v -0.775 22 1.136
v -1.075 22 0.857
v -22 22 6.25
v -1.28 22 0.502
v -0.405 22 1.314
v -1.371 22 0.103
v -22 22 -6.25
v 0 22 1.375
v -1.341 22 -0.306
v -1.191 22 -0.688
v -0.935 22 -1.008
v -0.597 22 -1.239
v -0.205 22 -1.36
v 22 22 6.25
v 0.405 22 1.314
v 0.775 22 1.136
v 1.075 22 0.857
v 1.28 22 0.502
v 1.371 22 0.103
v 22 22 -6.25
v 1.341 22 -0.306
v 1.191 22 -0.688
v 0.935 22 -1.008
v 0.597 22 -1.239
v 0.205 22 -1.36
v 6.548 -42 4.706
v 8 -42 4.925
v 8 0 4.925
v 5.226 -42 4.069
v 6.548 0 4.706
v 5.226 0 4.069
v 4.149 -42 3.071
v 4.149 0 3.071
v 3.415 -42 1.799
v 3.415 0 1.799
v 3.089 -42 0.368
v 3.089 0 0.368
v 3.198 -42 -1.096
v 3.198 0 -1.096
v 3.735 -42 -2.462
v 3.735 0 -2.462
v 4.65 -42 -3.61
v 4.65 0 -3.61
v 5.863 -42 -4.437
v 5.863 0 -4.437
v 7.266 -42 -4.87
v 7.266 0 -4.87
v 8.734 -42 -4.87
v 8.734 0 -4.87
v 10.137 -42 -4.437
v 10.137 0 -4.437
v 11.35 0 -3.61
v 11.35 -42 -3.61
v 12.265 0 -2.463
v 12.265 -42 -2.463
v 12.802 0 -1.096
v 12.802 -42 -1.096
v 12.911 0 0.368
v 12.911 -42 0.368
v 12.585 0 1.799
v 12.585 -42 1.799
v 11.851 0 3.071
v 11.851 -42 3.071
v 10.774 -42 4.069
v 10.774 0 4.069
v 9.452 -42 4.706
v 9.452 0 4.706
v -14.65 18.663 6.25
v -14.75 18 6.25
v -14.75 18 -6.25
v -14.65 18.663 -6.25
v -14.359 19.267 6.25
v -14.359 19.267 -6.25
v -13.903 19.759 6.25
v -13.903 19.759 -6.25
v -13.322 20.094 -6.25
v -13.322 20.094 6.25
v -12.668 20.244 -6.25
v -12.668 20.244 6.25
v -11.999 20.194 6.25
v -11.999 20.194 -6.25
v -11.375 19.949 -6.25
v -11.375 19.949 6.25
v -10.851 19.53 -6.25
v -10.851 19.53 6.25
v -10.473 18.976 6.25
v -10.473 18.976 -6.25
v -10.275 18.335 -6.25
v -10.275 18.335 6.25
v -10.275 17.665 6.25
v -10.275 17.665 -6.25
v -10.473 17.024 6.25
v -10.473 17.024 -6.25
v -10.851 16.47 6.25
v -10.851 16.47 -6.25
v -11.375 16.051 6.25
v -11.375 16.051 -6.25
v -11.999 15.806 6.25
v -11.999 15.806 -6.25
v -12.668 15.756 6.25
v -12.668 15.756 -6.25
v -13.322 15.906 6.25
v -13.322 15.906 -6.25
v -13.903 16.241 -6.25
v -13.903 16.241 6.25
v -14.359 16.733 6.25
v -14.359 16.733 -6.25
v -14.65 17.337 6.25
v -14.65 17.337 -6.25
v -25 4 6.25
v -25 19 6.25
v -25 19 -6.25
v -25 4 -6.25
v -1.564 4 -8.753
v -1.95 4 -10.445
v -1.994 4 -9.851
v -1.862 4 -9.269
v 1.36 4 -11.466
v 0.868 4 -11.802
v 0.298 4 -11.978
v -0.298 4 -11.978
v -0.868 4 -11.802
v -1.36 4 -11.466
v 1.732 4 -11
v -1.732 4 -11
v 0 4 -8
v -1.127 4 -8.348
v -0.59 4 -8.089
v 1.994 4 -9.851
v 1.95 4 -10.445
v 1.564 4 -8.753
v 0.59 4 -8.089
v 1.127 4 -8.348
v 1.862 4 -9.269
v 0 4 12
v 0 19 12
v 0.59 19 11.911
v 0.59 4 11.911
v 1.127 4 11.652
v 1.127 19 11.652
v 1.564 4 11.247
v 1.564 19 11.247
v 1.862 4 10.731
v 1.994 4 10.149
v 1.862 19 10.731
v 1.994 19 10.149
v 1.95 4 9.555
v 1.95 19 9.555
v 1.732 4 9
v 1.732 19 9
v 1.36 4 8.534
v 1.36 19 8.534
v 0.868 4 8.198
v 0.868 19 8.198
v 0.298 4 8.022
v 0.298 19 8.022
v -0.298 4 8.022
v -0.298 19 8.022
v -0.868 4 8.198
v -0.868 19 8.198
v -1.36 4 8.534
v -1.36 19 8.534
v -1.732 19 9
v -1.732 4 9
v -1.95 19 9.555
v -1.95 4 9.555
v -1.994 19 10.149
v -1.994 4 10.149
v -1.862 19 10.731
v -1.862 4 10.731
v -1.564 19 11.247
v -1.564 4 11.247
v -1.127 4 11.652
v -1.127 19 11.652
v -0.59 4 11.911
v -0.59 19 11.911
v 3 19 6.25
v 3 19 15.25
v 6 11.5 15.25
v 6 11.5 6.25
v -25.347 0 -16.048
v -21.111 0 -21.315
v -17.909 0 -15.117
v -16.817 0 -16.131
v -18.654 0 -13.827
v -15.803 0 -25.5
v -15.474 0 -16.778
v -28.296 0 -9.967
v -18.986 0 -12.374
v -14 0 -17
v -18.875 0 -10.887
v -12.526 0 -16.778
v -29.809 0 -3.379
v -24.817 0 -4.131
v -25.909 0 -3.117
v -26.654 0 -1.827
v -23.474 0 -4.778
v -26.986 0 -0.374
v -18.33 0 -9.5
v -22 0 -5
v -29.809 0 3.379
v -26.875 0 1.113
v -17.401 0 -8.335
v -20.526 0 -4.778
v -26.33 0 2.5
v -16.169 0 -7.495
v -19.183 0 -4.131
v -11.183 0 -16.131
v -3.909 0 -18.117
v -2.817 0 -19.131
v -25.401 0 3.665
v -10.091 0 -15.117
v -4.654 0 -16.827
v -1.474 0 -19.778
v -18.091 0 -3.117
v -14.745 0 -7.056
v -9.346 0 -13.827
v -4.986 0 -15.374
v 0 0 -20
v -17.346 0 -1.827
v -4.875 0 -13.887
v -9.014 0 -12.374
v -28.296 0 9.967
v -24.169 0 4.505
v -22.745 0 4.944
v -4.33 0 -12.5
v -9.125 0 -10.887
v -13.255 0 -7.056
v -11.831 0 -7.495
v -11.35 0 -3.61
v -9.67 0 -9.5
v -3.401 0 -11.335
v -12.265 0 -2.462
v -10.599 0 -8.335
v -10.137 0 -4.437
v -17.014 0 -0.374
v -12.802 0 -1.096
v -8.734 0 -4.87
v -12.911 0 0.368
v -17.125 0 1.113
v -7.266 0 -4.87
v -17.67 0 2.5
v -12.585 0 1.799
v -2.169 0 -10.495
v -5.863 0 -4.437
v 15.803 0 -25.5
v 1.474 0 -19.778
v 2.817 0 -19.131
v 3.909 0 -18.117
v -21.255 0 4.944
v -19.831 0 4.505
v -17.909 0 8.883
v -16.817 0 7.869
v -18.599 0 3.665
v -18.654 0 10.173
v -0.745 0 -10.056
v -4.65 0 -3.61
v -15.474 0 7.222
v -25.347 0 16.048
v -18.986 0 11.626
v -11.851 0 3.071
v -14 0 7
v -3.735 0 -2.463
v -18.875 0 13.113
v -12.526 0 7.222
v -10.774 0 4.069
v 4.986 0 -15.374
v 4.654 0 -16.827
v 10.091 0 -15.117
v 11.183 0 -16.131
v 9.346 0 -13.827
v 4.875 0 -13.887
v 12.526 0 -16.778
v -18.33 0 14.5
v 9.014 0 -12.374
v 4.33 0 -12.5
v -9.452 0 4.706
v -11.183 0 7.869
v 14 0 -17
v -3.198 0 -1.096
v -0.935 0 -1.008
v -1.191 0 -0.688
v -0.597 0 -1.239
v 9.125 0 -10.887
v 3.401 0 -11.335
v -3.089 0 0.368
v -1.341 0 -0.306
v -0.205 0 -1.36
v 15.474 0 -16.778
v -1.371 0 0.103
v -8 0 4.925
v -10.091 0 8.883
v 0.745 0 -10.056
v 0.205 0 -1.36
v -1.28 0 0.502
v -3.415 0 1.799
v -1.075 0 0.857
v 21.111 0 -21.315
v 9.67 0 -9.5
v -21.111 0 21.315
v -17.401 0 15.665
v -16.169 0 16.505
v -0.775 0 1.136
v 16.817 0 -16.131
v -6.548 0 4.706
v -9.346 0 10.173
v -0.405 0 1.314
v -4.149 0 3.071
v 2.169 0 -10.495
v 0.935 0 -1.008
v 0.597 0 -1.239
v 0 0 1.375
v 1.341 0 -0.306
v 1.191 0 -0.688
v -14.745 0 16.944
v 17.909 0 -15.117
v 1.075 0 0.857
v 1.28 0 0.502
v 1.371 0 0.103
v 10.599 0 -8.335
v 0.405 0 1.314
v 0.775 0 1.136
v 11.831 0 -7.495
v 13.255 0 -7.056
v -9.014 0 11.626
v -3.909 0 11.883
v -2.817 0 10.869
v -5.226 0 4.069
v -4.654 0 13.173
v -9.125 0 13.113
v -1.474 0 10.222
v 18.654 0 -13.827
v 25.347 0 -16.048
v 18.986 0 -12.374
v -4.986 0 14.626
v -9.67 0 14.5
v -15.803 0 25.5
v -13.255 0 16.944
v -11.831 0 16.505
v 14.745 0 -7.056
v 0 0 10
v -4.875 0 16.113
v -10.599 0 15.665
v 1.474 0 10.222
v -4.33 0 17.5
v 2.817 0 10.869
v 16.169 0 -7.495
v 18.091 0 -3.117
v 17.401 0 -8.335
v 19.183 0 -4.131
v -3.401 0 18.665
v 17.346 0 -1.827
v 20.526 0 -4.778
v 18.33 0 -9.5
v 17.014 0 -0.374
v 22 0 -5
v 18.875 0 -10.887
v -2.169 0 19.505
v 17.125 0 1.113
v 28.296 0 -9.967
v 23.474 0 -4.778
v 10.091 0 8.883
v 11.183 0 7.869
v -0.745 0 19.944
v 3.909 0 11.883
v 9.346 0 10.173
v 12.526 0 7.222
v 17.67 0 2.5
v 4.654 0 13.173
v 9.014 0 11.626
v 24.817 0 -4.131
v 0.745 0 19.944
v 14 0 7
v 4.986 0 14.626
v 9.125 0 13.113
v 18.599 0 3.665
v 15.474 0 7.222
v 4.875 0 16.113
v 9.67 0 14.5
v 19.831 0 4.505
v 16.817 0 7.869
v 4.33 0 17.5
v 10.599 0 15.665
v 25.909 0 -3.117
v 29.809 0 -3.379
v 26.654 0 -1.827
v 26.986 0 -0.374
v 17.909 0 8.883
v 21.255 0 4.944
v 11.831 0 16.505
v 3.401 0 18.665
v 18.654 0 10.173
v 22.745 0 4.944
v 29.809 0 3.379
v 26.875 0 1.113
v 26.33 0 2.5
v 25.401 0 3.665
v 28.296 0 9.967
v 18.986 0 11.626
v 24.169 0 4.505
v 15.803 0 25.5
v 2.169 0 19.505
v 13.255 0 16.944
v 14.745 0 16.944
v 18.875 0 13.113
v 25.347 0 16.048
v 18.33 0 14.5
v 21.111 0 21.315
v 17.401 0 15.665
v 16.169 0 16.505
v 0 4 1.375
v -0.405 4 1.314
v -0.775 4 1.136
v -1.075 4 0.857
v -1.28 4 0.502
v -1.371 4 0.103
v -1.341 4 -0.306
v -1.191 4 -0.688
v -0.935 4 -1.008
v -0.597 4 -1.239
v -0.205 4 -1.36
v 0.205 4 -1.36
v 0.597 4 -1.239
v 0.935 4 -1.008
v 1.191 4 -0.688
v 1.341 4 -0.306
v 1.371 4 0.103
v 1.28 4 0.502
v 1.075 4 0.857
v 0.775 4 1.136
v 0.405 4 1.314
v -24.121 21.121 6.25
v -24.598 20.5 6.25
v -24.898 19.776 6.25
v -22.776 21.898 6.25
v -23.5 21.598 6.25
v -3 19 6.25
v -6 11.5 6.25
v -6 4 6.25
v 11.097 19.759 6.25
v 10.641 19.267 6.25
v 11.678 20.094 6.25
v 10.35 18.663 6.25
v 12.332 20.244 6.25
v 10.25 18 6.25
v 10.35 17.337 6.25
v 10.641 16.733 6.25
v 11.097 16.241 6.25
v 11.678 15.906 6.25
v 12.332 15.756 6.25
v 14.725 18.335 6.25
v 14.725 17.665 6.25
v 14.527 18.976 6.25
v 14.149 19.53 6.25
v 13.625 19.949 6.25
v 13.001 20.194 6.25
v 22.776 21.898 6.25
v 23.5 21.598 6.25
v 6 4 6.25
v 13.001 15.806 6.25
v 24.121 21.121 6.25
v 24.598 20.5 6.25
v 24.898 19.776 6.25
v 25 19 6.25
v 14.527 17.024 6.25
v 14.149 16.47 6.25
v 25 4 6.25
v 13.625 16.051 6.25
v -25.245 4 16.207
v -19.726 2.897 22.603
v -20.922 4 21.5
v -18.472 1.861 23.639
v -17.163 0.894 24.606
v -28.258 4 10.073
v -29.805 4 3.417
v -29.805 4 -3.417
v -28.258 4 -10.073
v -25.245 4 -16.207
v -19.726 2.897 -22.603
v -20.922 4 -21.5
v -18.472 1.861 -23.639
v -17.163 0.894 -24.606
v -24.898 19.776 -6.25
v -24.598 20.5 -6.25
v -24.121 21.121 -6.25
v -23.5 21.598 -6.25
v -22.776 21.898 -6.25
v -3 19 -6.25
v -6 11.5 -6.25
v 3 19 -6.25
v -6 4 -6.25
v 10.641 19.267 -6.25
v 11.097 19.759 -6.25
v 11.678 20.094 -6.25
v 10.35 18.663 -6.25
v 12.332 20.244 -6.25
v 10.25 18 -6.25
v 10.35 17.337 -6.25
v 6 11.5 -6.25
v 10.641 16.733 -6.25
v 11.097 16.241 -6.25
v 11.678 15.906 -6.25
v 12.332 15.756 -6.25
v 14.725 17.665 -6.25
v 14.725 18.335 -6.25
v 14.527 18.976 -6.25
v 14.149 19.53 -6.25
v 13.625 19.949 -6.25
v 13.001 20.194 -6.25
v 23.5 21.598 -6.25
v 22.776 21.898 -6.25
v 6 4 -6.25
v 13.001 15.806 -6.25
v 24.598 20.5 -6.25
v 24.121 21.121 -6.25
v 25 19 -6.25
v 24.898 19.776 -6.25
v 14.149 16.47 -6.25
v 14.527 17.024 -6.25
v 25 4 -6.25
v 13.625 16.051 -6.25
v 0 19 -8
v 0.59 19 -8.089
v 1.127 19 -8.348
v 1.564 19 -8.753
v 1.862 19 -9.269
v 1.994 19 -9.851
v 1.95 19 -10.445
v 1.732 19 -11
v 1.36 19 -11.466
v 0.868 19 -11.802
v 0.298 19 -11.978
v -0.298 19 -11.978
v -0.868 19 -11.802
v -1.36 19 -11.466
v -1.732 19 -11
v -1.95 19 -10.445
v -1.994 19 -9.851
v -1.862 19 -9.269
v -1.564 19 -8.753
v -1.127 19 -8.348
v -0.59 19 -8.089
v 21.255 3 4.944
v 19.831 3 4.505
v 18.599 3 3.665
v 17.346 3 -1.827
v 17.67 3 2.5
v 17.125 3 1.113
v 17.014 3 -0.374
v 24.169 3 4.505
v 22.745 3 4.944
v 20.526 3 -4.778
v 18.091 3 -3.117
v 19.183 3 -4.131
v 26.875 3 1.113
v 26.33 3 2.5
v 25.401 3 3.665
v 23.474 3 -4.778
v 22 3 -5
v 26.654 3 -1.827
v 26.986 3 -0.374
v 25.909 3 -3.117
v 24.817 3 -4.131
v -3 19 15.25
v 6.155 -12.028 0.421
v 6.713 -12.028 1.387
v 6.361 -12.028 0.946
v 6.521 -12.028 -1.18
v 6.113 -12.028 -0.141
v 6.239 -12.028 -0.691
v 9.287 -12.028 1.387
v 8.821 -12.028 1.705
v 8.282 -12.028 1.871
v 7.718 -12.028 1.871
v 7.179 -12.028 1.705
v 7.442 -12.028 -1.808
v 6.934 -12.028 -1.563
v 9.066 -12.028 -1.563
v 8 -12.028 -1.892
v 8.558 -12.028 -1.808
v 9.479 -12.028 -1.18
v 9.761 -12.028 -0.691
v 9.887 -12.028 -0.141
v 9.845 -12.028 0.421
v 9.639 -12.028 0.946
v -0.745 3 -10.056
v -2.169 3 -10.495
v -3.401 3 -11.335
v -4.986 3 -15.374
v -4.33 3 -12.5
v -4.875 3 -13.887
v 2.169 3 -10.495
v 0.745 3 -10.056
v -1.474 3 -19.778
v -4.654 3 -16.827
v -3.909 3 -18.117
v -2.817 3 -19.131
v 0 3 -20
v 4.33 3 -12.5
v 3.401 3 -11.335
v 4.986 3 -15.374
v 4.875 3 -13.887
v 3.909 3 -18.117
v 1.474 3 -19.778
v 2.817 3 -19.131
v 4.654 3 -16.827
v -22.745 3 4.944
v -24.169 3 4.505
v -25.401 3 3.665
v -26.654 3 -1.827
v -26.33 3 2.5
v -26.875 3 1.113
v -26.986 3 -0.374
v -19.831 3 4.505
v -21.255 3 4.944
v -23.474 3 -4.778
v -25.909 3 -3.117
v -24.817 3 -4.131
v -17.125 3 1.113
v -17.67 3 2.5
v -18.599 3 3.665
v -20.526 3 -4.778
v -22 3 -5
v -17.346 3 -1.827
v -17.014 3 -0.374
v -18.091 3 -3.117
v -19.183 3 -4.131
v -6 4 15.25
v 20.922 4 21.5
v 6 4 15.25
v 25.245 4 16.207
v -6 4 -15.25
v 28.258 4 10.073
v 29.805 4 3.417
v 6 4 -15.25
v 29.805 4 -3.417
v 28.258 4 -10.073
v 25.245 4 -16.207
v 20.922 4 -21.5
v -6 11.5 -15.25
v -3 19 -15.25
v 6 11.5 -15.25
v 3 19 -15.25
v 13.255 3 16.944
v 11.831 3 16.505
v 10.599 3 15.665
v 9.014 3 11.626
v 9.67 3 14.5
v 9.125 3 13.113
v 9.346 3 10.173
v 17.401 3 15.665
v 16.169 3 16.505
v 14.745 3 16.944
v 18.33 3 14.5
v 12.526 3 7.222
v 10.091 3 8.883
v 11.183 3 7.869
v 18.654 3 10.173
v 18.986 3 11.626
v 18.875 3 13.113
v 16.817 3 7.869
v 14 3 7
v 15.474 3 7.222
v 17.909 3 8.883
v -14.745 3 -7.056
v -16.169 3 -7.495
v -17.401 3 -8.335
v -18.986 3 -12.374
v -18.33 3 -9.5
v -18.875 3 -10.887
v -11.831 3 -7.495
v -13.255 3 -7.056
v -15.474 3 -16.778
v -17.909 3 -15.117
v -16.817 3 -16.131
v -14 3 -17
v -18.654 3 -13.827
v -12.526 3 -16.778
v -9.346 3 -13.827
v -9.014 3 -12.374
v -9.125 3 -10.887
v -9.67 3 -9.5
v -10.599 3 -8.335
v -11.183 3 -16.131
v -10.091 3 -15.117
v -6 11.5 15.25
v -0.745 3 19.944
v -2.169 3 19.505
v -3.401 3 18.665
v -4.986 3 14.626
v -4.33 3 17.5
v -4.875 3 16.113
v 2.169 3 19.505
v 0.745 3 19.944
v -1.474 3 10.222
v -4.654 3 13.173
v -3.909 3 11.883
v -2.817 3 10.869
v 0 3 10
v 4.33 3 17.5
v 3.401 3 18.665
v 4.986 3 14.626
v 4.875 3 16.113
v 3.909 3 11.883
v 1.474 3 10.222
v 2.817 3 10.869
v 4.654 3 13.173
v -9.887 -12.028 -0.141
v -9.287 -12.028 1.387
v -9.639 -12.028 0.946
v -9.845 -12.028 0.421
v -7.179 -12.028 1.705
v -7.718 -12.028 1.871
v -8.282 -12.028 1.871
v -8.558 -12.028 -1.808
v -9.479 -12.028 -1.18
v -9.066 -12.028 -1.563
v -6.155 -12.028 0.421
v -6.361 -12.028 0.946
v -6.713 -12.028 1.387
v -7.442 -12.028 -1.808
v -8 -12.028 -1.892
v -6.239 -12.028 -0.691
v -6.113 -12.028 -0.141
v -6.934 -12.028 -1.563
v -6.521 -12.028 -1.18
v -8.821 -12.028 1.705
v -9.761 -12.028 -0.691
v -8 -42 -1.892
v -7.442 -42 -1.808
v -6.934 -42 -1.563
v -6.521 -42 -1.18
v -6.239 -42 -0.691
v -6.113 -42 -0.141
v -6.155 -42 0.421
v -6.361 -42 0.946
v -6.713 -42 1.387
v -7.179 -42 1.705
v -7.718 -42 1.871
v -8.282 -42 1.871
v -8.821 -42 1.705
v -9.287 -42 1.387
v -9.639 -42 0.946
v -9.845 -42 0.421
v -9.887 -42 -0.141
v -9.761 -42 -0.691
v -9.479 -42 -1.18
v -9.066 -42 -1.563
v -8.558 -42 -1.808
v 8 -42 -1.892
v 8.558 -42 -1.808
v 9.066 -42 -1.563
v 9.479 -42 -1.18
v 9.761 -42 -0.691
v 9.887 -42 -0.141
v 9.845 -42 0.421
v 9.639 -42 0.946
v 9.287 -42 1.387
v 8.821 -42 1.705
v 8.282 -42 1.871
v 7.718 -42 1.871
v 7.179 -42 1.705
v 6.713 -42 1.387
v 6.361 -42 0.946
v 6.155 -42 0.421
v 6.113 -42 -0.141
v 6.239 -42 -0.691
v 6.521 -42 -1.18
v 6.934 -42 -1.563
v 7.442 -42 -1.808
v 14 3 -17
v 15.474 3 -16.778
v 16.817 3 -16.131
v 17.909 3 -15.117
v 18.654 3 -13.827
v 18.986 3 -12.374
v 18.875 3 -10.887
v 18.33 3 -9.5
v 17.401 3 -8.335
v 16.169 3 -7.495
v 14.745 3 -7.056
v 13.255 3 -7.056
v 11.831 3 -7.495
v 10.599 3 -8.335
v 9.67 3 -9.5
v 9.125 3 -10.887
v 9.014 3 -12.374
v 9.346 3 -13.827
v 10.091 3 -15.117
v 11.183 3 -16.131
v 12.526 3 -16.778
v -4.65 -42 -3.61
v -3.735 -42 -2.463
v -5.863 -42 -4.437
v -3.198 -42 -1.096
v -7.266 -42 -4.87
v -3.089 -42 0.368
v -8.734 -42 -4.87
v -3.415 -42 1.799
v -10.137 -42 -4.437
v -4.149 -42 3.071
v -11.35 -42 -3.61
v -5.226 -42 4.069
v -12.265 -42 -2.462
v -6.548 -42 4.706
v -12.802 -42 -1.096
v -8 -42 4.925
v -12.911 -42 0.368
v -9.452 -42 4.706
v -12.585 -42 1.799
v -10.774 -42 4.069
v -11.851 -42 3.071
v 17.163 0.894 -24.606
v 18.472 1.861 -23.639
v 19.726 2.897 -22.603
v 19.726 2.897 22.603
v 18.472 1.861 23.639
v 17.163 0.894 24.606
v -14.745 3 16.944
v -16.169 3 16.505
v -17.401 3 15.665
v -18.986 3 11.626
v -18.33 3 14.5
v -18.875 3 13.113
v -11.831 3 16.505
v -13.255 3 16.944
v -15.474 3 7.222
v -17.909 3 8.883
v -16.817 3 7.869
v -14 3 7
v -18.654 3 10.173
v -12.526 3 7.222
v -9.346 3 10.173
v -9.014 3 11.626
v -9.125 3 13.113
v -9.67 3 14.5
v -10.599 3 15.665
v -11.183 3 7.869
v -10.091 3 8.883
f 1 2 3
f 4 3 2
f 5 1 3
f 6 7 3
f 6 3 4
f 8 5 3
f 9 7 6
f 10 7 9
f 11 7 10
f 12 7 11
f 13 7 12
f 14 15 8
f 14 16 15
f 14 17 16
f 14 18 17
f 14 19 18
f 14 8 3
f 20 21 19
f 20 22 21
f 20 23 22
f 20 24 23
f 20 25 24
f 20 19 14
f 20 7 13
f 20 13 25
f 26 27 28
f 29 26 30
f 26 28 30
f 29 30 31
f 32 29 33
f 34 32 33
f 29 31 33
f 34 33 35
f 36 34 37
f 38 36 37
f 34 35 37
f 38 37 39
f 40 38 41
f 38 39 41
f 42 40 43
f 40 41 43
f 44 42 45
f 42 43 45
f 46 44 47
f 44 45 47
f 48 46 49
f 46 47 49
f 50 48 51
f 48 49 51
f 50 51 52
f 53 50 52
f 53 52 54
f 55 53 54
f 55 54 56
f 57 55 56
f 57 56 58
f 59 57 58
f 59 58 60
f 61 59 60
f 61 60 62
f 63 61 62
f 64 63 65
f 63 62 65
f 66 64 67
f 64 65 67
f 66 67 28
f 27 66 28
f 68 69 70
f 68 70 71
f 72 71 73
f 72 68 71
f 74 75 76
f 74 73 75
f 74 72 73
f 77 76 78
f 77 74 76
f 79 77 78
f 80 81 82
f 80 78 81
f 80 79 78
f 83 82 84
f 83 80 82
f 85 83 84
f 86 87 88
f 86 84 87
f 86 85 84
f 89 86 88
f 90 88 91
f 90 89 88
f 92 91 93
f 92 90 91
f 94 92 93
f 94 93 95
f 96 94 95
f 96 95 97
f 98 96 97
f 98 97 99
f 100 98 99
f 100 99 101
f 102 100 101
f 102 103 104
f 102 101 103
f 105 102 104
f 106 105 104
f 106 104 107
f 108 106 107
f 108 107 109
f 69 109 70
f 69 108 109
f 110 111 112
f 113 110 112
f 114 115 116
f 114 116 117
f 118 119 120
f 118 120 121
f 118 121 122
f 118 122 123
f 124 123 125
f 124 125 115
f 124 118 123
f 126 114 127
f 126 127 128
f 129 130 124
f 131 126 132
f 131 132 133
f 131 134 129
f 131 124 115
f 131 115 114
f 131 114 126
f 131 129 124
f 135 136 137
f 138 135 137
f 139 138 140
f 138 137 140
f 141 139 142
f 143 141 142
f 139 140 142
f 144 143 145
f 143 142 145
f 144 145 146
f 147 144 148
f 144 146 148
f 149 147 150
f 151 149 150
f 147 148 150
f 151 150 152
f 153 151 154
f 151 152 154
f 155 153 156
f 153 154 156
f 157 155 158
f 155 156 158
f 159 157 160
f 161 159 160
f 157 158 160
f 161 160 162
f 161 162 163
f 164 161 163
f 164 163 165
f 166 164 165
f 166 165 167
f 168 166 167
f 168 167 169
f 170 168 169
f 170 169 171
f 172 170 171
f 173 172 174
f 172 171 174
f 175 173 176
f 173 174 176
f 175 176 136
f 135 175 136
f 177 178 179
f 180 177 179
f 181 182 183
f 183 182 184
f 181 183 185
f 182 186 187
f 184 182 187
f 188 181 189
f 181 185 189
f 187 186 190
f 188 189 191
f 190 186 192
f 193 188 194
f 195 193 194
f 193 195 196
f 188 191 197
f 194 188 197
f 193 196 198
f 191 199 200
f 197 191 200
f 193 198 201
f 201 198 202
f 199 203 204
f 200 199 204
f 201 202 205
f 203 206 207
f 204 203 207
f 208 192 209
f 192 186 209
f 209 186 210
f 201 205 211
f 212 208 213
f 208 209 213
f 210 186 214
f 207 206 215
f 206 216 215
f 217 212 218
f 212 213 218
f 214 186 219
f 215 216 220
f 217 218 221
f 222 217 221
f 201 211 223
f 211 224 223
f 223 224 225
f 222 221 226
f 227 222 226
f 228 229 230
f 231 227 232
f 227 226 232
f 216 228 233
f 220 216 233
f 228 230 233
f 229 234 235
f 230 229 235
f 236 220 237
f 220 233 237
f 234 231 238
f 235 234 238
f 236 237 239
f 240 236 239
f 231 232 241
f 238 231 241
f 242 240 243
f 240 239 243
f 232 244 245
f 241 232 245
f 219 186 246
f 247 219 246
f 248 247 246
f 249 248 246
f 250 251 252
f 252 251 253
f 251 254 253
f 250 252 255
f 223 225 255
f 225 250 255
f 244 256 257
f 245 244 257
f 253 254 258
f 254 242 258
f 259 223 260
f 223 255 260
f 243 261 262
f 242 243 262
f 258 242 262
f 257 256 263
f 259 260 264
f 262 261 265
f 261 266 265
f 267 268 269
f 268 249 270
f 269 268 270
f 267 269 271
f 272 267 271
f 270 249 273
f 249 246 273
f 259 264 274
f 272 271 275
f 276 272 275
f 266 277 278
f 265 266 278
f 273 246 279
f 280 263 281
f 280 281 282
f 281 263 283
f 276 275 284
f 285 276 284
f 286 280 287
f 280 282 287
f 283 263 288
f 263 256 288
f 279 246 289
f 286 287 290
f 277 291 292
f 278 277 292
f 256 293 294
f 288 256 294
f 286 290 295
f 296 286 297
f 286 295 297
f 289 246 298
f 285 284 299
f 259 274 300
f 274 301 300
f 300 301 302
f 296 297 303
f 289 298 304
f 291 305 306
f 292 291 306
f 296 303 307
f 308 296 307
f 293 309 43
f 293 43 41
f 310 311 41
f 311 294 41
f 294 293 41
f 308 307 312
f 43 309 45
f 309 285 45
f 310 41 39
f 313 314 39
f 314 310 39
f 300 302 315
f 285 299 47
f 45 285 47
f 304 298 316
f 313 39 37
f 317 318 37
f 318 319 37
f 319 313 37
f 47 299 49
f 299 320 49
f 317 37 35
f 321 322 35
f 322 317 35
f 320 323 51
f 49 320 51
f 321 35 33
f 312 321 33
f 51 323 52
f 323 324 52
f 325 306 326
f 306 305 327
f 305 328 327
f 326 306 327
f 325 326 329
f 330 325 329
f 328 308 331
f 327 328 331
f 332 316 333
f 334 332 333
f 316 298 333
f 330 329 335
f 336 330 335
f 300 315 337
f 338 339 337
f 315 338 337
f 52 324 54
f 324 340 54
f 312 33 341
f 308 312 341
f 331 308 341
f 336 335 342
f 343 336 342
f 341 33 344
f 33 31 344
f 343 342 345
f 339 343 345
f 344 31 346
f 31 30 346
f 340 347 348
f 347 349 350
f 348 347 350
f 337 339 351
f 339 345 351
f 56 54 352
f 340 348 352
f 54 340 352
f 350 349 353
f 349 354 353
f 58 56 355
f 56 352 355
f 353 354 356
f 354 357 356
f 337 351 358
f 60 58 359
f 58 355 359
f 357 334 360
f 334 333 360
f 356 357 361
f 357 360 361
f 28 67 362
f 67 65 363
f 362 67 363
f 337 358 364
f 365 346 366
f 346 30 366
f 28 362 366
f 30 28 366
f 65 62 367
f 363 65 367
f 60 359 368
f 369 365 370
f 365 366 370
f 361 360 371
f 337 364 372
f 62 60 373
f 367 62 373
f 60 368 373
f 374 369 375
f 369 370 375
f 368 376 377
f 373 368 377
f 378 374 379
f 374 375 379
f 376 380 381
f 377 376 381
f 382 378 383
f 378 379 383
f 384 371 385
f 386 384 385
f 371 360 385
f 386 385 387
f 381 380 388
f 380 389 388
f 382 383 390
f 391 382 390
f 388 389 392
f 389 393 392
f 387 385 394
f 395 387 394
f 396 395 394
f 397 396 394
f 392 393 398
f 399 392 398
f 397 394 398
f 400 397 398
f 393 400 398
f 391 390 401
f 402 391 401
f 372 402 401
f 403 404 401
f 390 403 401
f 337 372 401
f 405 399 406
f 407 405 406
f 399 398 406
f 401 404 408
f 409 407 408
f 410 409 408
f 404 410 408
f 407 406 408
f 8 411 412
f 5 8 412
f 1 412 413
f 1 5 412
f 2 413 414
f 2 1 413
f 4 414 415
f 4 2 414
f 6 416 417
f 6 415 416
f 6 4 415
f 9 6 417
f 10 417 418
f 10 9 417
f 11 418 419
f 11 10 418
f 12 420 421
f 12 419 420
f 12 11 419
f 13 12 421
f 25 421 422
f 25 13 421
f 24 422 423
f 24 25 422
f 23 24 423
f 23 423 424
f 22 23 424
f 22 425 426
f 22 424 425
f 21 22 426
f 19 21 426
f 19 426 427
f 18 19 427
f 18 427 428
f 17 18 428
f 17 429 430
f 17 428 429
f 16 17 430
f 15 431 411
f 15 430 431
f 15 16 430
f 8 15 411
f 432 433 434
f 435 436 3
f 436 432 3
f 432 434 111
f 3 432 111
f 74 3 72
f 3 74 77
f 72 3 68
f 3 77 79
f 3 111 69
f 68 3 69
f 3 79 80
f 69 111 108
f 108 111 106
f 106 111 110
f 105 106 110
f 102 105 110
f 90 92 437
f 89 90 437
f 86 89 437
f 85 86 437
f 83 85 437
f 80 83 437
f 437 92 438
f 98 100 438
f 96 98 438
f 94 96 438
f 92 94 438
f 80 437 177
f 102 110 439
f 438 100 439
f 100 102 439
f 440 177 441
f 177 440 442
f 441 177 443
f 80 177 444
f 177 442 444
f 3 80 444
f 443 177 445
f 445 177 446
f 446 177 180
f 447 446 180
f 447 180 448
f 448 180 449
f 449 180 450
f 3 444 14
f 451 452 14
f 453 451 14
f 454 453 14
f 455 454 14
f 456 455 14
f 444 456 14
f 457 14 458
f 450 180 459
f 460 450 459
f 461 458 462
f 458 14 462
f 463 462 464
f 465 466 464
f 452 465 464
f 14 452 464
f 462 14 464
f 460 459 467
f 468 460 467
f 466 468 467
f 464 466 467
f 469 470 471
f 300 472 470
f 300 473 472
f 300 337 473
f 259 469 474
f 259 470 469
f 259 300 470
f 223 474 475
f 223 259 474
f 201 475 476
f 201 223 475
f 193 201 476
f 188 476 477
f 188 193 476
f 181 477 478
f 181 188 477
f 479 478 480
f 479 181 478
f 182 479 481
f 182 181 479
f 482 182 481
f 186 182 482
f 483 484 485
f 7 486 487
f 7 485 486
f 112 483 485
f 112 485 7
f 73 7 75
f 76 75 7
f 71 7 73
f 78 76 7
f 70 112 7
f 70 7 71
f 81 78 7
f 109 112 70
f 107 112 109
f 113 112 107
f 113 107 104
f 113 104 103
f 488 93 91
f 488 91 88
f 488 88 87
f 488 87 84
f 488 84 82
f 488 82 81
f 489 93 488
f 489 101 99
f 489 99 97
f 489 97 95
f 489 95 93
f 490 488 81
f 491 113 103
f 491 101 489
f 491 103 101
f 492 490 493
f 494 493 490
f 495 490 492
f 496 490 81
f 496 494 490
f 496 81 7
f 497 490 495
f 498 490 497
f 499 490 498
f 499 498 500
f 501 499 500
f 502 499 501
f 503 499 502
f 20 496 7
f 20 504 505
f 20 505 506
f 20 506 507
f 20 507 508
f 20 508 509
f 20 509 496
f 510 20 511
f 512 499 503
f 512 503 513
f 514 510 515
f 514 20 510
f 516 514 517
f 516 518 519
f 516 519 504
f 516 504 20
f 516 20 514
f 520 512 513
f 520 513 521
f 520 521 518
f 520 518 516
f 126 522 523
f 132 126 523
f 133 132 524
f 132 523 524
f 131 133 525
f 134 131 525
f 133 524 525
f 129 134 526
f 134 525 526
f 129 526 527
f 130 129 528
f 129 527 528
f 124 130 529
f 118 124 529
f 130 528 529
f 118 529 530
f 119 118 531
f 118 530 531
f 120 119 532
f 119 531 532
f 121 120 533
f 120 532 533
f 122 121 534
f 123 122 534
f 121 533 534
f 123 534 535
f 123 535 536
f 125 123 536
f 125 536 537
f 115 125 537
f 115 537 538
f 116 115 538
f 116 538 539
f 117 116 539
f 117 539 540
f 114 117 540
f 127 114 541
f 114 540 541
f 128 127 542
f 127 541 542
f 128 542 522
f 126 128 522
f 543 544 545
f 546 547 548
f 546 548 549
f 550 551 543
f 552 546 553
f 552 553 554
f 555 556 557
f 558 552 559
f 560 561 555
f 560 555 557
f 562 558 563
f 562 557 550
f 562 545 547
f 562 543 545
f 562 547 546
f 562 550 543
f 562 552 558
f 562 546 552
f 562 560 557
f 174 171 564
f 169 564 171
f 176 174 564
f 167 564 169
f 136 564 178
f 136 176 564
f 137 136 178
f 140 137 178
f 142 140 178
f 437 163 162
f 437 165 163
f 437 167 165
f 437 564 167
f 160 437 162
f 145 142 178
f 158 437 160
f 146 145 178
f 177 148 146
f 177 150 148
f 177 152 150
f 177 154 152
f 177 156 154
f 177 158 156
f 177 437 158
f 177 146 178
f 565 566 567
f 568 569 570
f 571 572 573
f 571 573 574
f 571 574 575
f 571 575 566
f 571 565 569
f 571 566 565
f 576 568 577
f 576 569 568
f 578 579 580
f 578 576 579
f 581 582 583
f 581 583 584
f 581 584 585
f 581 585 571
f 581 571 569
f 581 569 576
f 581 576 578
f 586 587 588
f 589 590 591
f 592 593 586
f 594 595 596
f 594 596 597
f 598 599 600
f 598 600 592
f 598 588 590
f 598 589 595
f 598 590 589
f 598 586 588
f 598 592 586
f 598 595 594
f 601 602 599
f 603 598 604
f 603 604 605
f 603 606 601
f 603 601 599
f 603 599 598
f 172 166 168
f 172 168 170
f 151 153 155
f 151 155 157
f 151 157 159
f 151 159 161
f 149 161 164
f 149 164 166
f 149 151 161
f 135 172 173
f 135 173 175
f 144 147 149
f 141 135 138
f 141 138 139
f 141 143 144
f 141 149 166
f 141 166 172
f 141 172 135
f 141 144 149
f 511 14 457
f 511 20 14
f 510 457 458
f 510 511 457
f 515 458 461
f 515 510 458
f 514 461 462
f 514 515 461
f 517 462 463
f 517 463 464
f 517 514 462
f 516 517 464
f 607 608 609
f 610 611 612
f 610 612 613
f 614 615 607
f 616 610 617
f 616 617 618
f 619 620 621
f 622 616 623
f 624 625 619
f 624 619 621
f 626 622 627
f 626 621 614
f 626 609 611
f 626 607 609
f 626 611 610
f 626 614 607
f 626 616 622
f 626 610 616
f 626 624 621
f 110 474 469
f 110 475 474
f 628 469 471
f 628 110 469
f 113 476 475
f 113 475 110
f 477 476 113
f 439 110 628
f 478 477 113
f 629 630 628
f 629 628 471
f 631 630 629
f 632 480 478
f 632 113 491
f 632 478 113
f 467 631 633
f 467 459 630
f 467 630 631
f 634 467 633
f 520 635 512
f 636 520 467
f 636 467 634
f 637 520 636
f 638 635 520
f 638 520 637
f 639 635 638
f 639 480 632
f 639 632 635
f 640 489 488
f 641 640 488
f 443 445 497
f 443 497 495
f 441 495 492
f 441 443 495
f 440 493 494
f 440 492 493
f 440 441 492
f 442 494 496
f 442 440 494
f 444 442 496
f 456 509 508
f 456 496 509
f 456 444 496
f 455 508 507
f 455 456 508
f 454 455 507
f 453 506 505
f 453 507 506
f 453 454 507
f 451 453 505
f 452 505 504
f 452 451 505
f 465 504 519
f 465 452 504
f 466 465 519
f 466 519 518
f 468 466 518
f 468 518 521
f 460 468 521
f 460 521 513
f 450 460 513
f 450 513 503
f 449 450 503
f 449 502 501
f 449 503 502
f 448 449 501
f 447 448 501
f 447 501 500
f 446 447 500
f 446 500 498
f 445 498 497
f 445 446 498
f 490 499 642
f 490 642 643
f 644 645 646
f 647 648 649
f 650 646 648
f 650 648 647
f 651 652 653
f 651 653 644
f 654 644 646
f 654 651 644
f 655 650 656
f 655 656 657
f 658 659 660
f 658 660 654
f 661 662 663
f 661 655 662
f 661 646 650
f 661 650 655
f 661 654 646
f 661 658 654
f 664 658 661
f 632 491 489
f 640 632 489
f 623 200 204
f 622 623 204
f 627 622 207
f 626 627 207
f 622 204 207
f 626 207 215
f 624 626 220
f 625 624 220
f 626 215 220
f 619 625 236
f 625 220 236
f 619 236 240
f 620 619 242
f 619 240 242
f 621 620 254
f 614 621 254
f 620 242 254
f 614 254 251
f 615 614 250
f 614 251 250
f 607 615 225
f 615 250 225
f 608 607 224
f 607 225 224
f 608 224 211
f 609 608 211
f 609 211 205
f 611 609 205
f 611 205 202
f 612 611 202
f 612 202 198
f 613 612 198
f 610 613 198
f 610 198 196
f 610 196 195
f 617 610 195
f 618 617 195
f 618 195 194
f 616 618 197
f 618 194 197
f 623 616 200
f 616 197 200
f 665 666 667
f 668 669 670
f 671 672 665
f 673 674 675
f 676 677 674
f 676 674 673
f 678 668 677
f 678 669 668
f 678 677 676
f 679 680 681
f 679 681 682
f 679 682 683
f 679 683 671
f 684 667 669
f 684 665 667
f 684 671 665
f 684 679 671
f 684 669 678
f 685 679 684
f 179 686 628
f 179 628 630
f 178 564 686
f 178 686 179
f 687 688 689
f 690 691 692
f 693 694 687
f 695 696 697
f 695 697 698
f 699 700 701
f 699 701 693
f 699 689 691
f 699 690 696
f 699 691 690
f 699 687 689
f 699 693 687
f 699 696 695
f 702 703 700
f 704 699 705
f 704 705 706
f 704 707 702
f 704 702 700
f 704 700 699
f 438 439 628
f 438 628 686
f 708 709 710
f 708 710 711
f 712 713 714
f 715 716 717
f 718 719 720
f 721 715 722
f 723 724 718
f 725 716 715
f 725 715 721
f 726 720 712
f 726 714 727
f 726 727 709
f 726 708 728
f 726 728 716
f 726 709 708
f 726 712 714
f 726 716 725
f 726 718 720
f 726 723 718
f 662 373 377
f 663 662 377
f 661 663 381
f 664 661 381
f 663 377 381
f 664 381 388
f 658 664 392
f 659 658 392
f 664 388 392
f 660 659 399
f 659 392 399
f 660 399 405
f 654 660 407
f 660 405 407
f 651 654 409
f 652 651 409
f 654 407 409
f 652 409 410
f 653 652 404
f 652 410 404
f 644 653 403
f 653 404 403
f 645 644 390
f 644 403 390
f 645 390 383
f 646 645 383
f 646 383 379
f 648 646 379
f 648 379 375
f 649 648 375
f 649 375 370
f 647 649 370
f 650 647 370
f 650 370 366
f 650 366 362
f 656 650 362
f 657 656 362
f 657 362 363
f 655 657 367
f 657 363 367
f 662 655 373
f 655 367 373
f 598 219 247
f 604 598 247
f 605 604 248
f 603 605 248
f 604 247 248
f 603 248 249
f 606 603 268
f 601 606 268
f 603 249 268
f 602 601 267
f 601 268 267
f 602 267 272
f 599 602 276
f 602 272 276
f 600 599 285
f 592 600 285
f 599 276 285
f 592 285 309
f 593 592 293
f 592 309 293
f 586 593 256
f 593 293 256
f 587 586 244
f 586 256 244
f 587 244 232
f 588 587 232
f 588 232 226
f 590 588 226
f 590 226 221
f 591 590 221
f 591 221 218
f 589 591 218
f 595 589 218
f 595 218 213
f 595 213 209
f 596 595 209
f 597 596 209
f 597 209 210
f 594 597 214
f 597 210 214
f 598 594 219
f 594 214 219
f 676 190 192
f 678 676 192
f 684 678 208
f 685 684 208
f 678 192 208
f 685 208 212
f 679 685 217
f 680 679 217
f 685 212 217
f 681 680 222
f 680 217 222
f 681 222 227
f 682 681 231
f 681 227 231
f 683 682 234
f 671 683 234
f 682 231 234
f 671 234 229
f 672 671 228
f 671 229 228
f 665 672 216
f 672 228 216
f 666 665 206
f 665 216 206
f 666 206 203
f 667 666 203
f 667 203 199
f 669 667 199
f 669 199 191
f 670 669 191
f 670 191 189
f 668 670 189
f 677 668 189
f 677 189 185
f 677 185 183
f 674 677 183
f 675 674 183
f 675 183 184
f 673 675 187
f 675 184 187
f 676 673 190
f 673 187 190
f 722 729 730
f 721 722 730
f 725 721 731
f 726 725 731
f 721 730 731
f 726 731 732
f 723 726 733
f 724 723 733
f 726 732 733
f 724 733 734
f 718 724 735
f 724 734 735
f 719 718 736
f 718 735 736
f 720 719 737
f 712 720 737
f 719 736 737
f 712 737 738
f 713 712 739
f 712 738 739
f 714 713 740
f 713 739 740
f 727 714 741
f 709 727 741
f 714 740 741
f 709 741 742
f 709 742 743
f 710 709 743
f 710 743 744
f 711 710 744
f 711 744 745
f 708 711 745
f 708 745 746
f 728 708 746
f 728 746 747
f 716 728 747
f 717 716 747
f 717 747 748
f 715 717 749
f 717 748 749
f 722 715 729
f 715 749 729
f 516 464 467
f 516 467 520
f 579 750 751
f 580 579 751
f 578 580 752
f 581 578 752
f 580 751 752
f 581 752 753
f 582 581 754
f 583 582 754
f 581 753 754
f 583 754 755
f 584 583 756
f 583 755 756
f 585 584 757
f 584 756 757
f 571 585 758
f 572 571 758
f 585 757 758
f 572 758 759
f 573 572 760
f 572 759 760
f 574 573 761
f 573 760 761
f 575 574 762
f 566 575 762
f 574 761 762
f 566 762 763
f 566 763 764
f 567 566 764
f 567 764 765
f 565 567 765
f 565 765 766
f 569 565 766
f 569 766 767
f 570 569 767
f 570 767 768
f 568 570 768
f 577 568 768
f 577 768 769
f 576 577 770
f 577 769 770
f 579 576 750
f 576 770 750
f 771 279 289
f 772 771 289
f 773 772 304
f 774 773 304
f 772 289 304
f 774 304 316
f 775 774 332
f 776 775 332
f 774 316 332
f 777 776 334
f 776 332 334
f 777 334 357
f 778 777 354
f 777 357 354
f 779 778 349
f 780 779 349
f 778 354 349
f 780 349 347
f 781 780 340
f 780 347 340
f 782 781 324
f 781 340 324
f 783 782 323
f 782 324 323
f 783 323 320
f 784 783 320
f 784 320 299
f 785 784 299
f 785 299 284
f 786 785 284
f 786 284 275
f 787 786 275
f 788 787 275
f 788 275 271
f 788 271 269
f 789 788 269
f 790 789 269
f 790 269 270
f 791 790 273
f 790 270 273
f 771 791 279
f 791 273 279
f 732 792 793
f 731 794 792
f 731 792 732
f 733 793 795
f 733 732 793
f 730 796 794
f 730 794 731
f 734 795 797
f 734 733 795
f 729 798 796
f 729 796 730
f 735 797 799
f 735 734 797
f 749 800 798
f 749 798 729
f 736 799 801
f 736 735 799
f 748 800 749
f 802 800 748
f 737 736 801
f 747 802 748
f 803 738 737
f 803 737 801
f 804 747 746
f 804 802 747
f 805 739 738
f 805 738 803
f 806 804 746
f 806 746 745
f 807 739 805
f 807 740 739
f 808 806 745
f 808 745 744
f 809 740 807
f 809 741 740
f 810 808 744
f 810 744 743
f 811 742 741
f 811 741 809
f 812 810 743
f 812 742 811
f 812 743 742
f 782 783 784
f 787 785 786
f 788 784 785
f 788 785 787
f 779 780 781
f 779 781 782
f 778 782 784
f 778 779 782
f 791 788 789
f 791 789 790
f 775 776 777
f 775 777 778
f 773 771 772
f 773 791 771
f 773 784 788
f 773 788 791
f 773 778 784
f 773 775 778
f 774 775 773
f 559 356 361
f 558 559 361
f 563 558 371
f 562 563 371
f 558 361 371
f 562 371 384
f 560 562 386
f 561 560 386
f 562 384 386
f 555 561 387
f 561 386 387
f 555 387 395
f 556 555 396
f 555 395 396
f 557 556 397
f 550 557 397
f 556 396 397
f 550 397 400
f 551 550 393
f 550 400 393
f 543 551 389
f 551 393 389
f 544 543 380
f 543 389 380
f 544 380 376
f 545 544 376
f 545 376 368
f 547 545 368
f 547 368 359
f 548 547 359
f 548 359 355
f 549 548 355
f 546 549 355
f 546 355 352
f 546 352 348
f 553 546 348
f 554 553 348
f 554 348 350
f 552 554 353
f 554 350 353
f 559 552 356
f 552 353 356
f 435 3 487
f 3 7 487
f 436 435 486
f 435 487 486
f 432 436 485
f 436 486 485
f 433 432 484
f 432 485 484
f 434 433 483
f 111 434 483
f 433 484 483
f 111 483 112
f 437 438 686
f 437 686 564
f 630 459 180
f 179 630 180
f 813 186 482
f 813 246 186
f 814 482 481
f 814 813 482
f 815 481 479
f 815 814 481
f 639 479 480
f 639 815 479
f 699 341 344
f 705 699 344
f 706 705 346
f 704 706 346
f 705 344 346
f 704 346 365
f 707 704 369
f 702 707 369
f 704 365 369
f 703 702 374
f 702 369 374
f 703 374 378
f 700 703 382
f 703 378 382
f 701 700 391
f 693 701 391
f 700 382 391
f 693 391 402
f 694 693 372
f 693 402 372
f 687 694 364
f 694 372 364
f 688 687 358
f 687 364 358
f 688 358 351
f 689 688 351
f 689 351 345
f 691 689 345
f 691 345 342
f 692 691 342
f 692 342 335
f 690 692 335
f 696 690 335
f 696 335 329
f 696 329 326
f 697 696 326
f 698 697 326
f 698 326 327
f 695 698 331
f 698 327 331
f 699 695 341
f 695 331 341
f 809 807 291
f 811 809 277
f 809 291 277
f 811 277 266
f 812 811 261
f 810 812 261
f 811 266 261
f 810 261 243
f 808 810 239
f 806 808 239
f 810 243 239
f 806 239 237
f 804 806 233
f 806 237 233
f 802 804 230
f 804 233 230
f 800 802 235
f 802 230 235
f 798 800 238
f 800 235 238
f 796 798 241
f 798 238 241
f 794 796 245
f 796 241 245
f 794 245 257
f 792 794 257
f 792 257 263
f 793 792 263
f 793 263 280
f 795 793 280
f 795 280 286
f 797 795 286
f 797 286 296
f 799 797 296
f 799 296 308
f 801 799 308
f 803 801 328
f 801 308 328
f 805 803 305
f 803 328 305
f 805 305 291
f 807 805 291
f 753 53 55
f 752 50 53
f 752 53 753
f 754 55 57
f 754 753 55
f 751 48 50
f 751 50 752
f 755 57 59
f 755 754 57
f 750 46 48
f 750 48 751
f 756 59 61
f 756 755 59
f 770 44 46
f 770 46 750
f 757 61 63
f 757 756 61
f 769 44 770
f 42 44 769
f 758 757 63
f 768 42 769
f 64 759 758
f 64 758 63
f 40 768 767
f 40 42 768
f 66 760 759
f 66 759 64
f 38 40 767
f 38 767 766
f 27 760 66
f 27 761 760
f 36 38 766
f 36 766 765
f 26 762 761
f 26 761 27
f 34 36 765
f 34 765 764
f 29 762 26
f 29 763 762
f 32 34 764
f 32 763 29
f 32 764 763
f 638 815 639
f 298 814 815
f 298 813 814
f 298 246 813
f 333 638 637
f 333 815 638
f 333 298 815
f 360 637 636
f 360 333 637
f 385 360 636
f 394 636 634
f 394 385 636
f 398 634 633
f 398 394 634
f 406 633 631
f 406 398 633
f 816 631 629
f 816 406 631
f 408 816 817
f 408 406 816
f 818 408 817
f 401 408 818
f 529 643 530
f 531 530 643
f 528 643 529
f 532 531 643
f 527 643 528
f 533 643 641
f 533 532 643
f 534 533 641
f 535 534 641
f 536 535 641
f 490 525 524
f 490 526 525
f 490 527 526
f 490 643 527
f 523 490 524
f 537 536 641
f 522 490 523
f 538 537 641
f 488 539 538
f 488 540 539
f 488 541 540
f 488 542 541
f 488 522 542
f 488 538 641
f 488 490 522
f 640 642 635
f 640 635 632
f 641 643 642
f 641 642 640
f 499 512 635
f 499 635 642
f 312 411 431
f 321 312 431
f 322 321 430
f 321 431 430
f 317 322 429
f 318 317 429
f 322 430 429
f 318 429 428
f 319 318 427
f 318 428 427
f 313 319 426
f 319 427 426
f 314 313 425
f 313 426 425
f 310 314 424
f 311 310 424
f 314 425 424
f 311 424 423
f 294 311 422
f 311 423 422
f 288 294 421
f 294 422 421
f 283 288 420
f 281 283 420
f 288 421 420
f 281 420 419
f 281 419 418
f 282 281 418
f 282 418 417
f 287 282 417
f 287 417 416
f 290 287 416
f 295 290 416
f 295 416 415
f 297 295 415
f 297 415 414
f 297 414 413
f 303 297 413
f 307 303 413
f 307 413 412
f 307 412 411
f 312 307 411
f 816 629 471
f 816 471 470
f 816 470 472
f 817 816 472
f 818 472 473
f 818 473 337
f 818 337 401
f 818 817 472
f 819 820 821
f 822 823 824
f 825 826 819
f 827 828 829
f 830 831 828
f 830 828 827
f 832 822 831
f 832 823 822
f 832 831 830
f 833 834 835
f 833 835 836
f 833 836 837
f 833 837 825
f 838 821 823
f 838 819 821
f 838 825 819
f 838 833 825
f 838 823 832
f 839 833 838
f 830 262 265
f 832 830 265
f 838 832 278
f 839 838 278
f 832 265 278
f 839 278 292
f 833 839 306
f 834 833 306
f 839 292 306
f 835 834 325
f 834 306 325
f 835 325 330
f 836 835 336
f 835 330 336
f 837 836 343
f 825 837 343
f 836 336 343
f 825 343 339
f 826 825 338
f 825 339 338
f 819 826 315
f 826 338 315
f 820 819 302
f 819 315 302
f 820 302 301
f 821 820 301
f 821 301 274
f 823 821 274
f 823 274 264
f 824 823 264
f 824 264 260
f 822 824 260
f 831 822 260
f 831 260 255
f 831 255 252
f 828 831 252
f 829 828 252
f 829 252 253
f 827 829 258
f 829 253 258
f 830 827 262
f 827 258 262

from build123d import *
from build123d.topology import SkipClean

# Parameters (mm, degrees)
SKETCH1_R                            = 30
BOSS_EXTRUDE1_DEPTH                  = 4
BOSS_EXTRUDE2_REACH                  = 44.615
BOSS_EXTRUDE2_END_RADIUS             = 30
BOSS_EXTRUDE2_DIRECTION_2_REACH      = 44.615
BOSS_EXTRUDE2_DIRECTION_2_END_RADIUS = 30
SKETCH3_OUTSIDE_W                    = 78.092
SKETCH3_OUTSIDE_H                    = 69.092
SKETCH3_OUTSIDE_R                    = 21.5
CUT_EXTRUDE2_DEPTH                   = 12.5
BOSS_EXTRUDE3_DEPTH                  = 18
BOSS_EXTRUDE4_DEPTH                  = 15
BOSS_EXTRUDE5_DEPTH                  = 15
CUT_EXTRUDE3_DEPTH                   = 44.292609069
CUT_EXTRUDE3_DEPTH_BACK              = 44.292609069
SKETCH8_R                            = 2
CUT_EXTRUDE8_DEPTH                   = 48.077064479
CUT_EXTRUDE8_DEPTH_BACK              = 48.077064479
CUT_EXTRUDE9_DEPTH                   = 59.659818207
CUT_EXTRUDE11_DEPTH                  = 20
CUT_EXTRUDE12_DEPTH                  = 20
CUT_EXTRUDE13_DEPTH                  = 20
CUT_EXTRUDE14_DEPTH                  = 44.292609069
CUT_EXTRUDE14_DEPTH_BACK             = 44.292609069
SKETCH25_W                           = 66.075437062
SKETCH25_H                           = 20.142243048
SKETCH27_R                           = 1.375
CUT_EXTRUDE16_DEPTH                  = 30
SKETCH28_R                           = 5
CUT_EXTRUDE17_DEPTH                  = 3
CUT_EXTRUDE18_DEPTH                  = 43.690748412
CUT_EXTRUDE18_DEPTH_BACK             = 43.690748412
SKETCH29_W                           = 43.412566799
SKETCH29_H                           = 13.326200919
SKETCH32_W                           = 50
SKETCH32_H                           = 12.5
BOSS_EXTRUDE6_DEPTH                  = 18
SKETCH35_W                           = 12
SKETCH35_H                           = 15
BOSS_EXTRUDE7_DEPTH                  = 9
CUT_EXTRUDE19_DEPTH                  = 49.908715992
CUT_EXTRUDE19_DEPTH_BACK             = 49.908715992
SKETCH37_R                           = 2.25
SKETCH36_R                           = 2
CUT_EXTRUDE20_DEPTH                  = 15
SKETCH39_W                           = 12
SKETCH39_H                           = 15
BOSS_EXTRUDE8_DEPTH                  = 9
SKETCH40_R                           = 2
CUT_EXTRUDE21_DEPTH                  = 15
FILLET1_R                            = 3
FILLET2_R                            = 3
CUT_EXTRUDE24_START                  = -20
SKETCH44_R                           = 1.375
CUT_EXTRUDE24_DEPTH                  = 20
SKETCH45_R                           = 4.925
BOSS_EXTRUDE9_DEPTH                  = 42
SKETCH46_R                           = 1.8923
CUT_EXTRUDE25_DEPTH                  = 29.972
SKETCH47_R                           = 1.8923
CUT_EXTRUDE26_DEPTH                  = 29.972
CUT_EXTRUDE32_DEPTH                  = 9
CUT_EXTRUDE33_DEPTH                  = 9
CUT_EXTRUDE34_DEPTH                  = 9
CUT_EXTRUDE35_DEPTH                  = 9


with BuildPart() as part:
    # Sketch1 → Boss-Extrude1 (new body)
    with BuildSketch(Plane(origin=(0, 0, 0), x_dir=(1, 0, 0), z_dir=(0, 1, 0))):
        with Locations(Location((0, 0, 0), (0, 0, 270))):
            Circle(SKETCH1_R)
    extrude(amount=BOSS_EXTRUDE1_DEPTH)

    # Boss-Extrude2: up to this cylinder (the profile starts inside it)
    with SkipClean():  # the faces are left unmerged after this step: merging them gives an invalid solid
        boss_extrude2_end = Plane(origin=(0, 9.396175, 0), z_dir=(0, -1, 0)) * Cylinder(BOSS_EXTRUDE2_END_RADIUS, 150.23, mode=Mode.PRIVATE)
        # Sketch2 → Boss-Extrude2 (add, up to the surface)
        with BuildSketch(Plane(origin=(0, 0, 0), x_dir=(0, 0, -1), z_dir=(1, 0, 0)), mode=Mode.PRIVATE) as boss_extrude2_sk1:
            Polygon((0, 4), (21.5, 4), (9, 16.5), (-9, 16.5), (-21.5, 4), align=None)
        boss_extrude2_tool1 = extrude(boss_extrude2_sk1.sketch, amount=BOSS_EXTRUDE2_REACH, mode=Mode.PRIVATE) & boss_extrude2_end
        add(boss_extrude2_tool1.solids().sort_by_distance((0, 9.396175, 0))[0])

    # Boss-Extrude2 direction 2: up to this cylinder (the profile starts inside it)
    with SkipClean():  # the faces are left unmerged after this step: merging them gives an invalid solid
        boss_extrude2_direction_2_end = Plane(origin=(0, 9.396175, 0), z_dir=(0, -1, 0)) * Cylinder(BOSS_EXTRUDE2_DIRECTION_2_END_RADIUS, 150.23, mode=Mode.PRIVATE)
        # Sketch2 → Boss-Extrude2 direction 2 (add, up to the surface)
        with BuildSketch(Plane(origin=(0, 0, 0), x_dir=(0, 0, -1), z_dir=(1, 0, 0)), mode=Mode.PRIVATE) as boss_extrude2_direction_2_sk1:
            Polygon((0, 4), (21.5, 4), (9, 16.5), (-9, 16.5), (-21.5, 4), align=None)
        boss_extrude2_direction_2_tool1 = extrude(boss_extrude2_direction_2_sk1.sketch, amount=-BOSS_EXTRUDE2_DIRECTION_2_REACH, mode=Mode.PRIVATE) & boss_extrude2_direction_2_end
        add(boss_extrude2_direction_2_tool1.solids().sort_by_distance((0, 9.396175, 0))[0])

    # SurfaceCut1
    split(bisect_by=Plane(origin=(0, 12.75, -12.75), x_dir=(1, 0, 0), z_dir=(0, 0.7071067811865558, -0.7071067811865392)), keep=Keep.BOTTOM)

    # SurfaceCut2
    split(bisect_by=Plane(origin=(0, 12.75, 12.75), x_dir=(1, 0, 0), z_dir=(0, 0.7071067811865509, 0.7071067811865442)), keep=Keep.BOTTOM)

    # Sketch3 outside → Cut-Extrude2 (cut)
    with BuildSketch(Plane(origin=(0, 4, 0), x_dir=(1, 0, 0), z_dir=(0, 1, 0))):
        Rectangle(SKETCH3_OUTSIDE_W, SKETCH3_OUTSIDE_H)
        Circle(SKETCH3_OUTSIDE_R, mode=Mode.SUBTRACT)
    extrude(amount=CUT_EXTRUDE2_DEPTH, mode=Mode.SUBTRACT)

    # Sketch5 → Boss-Extrude3 (add)
    with BuildSketch(Plane(origin=(0, 0, 0), x_dir=(-1, 0, 0), z_dir=(0, -1, 0))):
        Polygon((0, -6), (-17.5, -6), (-17.5, 6), (17.5, 6), (17.5, -6), align=None)
    extrude(amount=BOSS_EXTRUDE3_DEPTH)

    # Sketch6 → Boss-Extrude4 (add)
    with BuildSketch(Plane.XZ):
        Polygon((0, 15), (7, 15), (7, 6), (-7, 6), (-7, 15), align=None)
    extrude(amount=BOSS_EXTRUDE4_DEPTH)

    # Sketch7 → Boss-Extrude5 (add)
    with BuildSketch(Plane.XZ):
        Polygon((0, -15), (7, -15), (7, -6), (-7, -6), (-7, -15), align=None)
    extrude(amount=BOSS_EXTRUDE5_DEPTH)

    # Sketch8 → Cut-Extrude3 (cut, two sides: drawn at the far end of the back side and taken through both)
    with BuildSketch(Plane.XY.offset(-CUT_EXTRUDE3_DEPTH_BACK)):
        with Locations((-12.5, -12.5)):
            Circle(SKETCH8_R)
        with Locations((12.5, -12.5)):
            Circle(SKETCH8_R)
    extrude(amount=CUT_EXTRUDE3_DEPTH + CUT_EXTRUDE3_DEPTH_BACK, mode=Mode.SUBTRACT)

    # Sketch16 → Cut-Extrude8 (cut, two sides: drawn at the far end of the back side and taken through both)
    with BuildSketch(Plane.XY.offset(6).offset(-CUT_EXTRUDE8_DEPTH_BACK)):
        Polygon((17.5, -18), (17.5, -14.5), (14, -18), align=None)
        Polygon((-17.5, -18), (-14, -18), (-17.5, -14.5), align=None)
    extrude(amount=CUT_EXTRUDE8_DEPTH + CUT_EXTRUDE8_DEPTH_BACK, mode=Mode.SUBTRACT)

    # Sketch17 → Cut-Extrude9 (cut, through all)
    with BuildSketch(Plane(origin=(10.365975269, -9.674910251, -8.062425209), x_dir=(-0.3613483622370374, 0.337258471421235, -0.8693009171531012), z_dir=(0.6355070151731325, -0.5931398808282571, -0.49428323402354774))):
        Polygon((-2.372510104, -6.189601271), (7.980636686, -0.706686759), (7.980636686, -10.965829024), align=None)
    extrude(amount=CUT_EXTRUDE9_DEPTH, mode=Mode.SUBTRACT)

    # Sketch19 → Cut-Extrude11 (cut)
    with BuildSketch(Plane(origin=(-10.365975269, -9.674910251, -8.062425209), x_dir=(0.3613483622370374, 0.33725847142123494, -0.8693009171531012), z_dir=(0.6355070151731324, 0.5931398808282571, 0.4942832340235476))):
        Polygon((-2.372510104, -6.189601271), (7.980636686, -10.965829024), (7.980636686, -0.706686759), align=None)
    extrude(amount=-CUT_EXTRUDE11_DEPTH, mode=Mode.SUBTRACT)

    # Sketch20 → Cut-Extrude12 (cut)
    with BuildSketch(Plane(origin=(-10.365975269, -9.674910251, 8.062425209), x_dir=(-0.3613483622370374, -0.3372584714212349, -0.8693009171531013), z_dir=(0.6355070151731326, 0.593139880828257, -0.49428323402354757))):
        Polygon((2.372510104, -6.189601271), (-7.980636686, -0.706686759), (-7.980636686, -10.965829024), align=None)
    extrude(amount=-CUT_EXTRUDE12_DEPTH, mode=Mode.SUBTRACT)

    # Sketch21 → Cut-Extrude13 (cut)
    with BuildSketch(Plane(origin=(10.365975269, -9.674910251, 8.062425209), x_dir=(-0.3613483622370374, 0.3372584714212349, 0.8693009171531013), z_dir=(-0.6355070151731326, 0.593139880828257, -0.49428323402354757))):
        Polygon((-2.372510104, -6.189601271), (7.980636686, -0.706686759), (7.980636686, -10.965829024), align=None)
    extrude(amount=-CUT_EXTRUDE13_DEPTH, mode=Mode.SUBTRACT)

    # Sketch25 → Cut-Extrude14 (cut, two sides: drawn at the far end of the back side and taken through both)
    with BuildSketch(Plane.XY.offset(-CUT_EXTRUDE14_DEPTH_BACK)):
        with Locations((0, -10.071121524)):
            Rectangle(SKETCH25_W, SKETCH25_H)
    extrude(amount=CUT_EXTRUDE14_DEPTH + CUT_EXTRUDE14_DEPTH_BACK, mode=Mode.SUBTRACT)

    # Sketch27 → Cut-Extrude16 (cut)
    with BuildSketch(Plane(origin=(0, 16.5, 0), x_dir=(1, 0, 0), z_dir=(0, 1, 0))):
        with Locations(Location((0, 0, 0), (0, 0, 270))):
            Circle(SKETCH27_R)
    extrude(amount=-CUT_EXTRUDE16_DEPTH, mode=Mode.SUBTRACT)

    # Sketch28 → Cut-Extrude17 (cut)
    with BuildSketch(Plane.XZ):
        with Locations(Location((0, -15, 0), (0, 0, 270))):
            Circle(SKETCH28_R)
        with Locations(Location((22, 0, 0), (0, 0, 270))):
            Circle(SKETCH28_R)
        with Locations(Location((0, 15, 0), (0, 0, 270))):
            Circle(SKETCH28_R)
        with Locations(Location((-22, 0, 0), (0, 0, 270))):
            Circle(SKETCH28_R)
        with Locations(Location((-14, 12, 0), (0, 0, 270))):
            Circle(SKETCH28_R)
        with Locations(Location((14, 12, 0), (0, 0, 270))):
            Circle(SKETCH28_R)
        with Locations(Location((14, -12, 0), (0, 0, 270))):
            Circle(SKETCH28_R)
        with Locations(Location((-14, -12, 0), (0, 0, 270))):
            Circle(SKETCH28_R)
    extrude(amount=-CUT_EXTRUDE17_DEPTH, mode=Mode.SUBTRACT)

    # Sketch29 → Cut-Extrude18 (cut, two sides: drawn at the far end of the back side and taken through both)
    with BuildSketch(Plane(origin=(0, 0, 0), x_dir=(0, 0, -1), z_dir=(1, 0, 0)).offset(-CUT_EXTRUDE18_DEPTH_BACK)):
        with Locations((0.2062834, 10.66310046)):
            Rectangle(SKETCH29_W, SKETCH29_H)
    extrude(amount=CUT_EXTRUDE18_DEPTH + CUT_EXTRUDE18_DEPTH_BACK, mode=Mode.SUBTRACT)

    # Sketch32 → Boss-Extrude6 (add)
    with BuildSketch(Plane(origin=(0, 4, 0), x_dir=(1, 0, 0), z_dir=(0, 1, 0))):
        Rectangle(SKETCH32_W, SKETCH32_H)
    extrude(amount=BOSS_EXTRUDE6_DEPTH)

    # Sketch35 → Boss-Extrude7 (add)
    with BuildSketch(Plane(origin=(0, 0, -6.25), x_dir=(-1, 0, 0), z_dir=(0, 0, -1))):
        with Locations((0, 11.5)):
            Rectangle(SKETCH35_W, SKETCH35_H)
    extrude(amount=BOSS_EXTRUDE7_DEPTH)

    # Sketch37 → Cut-Extrude19 (cut, two sides: drawn at the far end of the back side and taken through both)
    with BuildSketch(Plane(origin=(0, 0, -6.25), x_dir=(-1, 0, 0), z_dir=(0, 0, -1)).offset(-CUT_EXTRUDE19_DEPTH_BACK)):
        with Locations((-12.5, 18)):
            Circle(SKETCH37_R)
        with Locations((12.5, 18)):
            Circle(SKETCH37_R)
    extrude(amount=CUT_EXTRUDE19_DEPTH + CUT_EXTRUDE19_DEPTH_BACK, mode=Mode.SUBTRACT)

    # Sketch36 → Cut-Extrude20 (cut)
    with BuildSketch(Plane(origin=(0, 19, 0), x_dir=(1, 0, 0), z_dir=(0, 1, 0))):
        with Locations(Location((0, 10, 0), (0, 0, 270))):
            Circle(SKETCH36_R)
    extrude(amount=-CUT_EXTRUDE20_DEPTH, mode=Mode.SUBTRACT)

    # Sketch39 → Boss-Extrude8 (add)
    with BuildSketch(Plane.XY.offset(6.25)):
        with Locations((0, 11.5)):
            Rectangle(SKETCH39_W, SKETCH39_H)
    extrude(amount=BOSS_EXTRUDE8_DEPTH)

    # Sketch40 → Cut-Extrude21 (cut)
    with BuildSketch(Plane(origin=(0, 19, 0), x_dir=(1, 0, 0), z_dir=(0, 1, 0))):
        with Locations(Location((0, -10, 0), (0, 0, 270))):
            Circle(SKETCH40_R)
    extrude(amount=-CUT_EXTRUDE21_DEPTH, mode=Mode.SUBTRACT)

    # Fillet1
    fillet1_edges = [part.edges().sort_by_distance(p)[0] for p in [
        (25, 22, 0),
    ]]
    fillet(fillet1_edges, radius=FILLET1_R)

    # Fillet2
    fillet2_edges = [part.edges().sort_by_distance(p)[0] for p in [
        (-25, 22, 0),
    ]]
    fillet(fillet2_edges, radius=FILLET2_R)

    # Sketch44 → Cut-Extrude24 (cut)
    with BuildSketch(Plane.XZ.offset(-4).offset(CUT_EXTRUDE24_START)):
        with Locations(Location((0, 0, 0), (0, 0, 90))):
            Circle(SKETCH44_R)
    extrude(amount=CUT_EXTRUDE24_DEPTH, mode=Mode.SUBTRACT)

    # Sketch45 → Boss-Extrude9 (add)
    with BuildSketch(Plane.XZ):
        with Locations(Location((-8, 0, 0), (0, 0, 90))):
            Circle(SKETCH45_R)
        with Locations(Location((8, 0, 0), (0, 0, 90))):
            Circle(SKETCH45_R)
    extrude(amount=BOSS_EXTRUDE9_DEPTH)

    # Sketch46 → Cut-Extrude25 (cut)
    with BuildSketch(Plane.XZ.offset(42)):
        with Locations(Location((-8, 0, 0), (0, 0, 270))):
            Circle(SKETCH46_R)
    extrude(amount=-CUT_EXTRUDE25_DEPTH, mode=Mode.SUBTRACT)

    # Sketch47 → Cut-Extrude26 (cut)
    with BuildSketch(Plane.XZ.offset(42)):
        with Locations(Location((8, 0, 0), (0, 0, 270))):
            Circle(SKETCH47_R)
    extrude(amount=-CUT_EXTRUDE26_DEPTH, mode=Mode.SUBTRACT)

    # Sketch58 → Cut-Extrude32 (cut)
    with BuildSketch(Plane(origin=(0, 0, -15.25), x_dir=(-1, 0, 0), z_dir=(0, 0, -1))):
        Polygon((6, 19), (6, 11.5), (3, 19), align=None)
    extrude(amount=-CUT_EXTRUDE32_DEPTH, mode=Mode.SUBTRACT)

    # Sketch59 → Cut-Extrude33 (cut)
    with BuildSketch(Plane(origin=(0, 0, -15.25), x_dir=(-1, 0, 0), z_dir=(0, 0, -1))):
        Polygon((-6, 19), (-6, 11.5), (-3, 19), align=None)
    extrude(amount=-CUT_EXTRUDE33_DEPTH, mode=Mode.SUBTRACT)

    # Sketch60 → Cut-Extrude34 (cut)
    with BuildSketch(Plane.XY.offset(15.25)):
        Polygon((6, 11.5), (6, 19), (3, 19), align=None)
    extrude(amount=-CUT_EXTRUDE34_DEPTH, mode=Mode.SUBTRACT)

    # Sketch61 → Cut-Extrude35 (cut)
    with BuildSketch(Plane.XY.offset(15.25)):
        Polygon((-6, 19), (-6, 11.5), (-3, 19), align=None)
    extrude(amount=-CUT_EXTRUDE35_DEPTH, mode=Mode.SUBTRACT)


solid = part.part
